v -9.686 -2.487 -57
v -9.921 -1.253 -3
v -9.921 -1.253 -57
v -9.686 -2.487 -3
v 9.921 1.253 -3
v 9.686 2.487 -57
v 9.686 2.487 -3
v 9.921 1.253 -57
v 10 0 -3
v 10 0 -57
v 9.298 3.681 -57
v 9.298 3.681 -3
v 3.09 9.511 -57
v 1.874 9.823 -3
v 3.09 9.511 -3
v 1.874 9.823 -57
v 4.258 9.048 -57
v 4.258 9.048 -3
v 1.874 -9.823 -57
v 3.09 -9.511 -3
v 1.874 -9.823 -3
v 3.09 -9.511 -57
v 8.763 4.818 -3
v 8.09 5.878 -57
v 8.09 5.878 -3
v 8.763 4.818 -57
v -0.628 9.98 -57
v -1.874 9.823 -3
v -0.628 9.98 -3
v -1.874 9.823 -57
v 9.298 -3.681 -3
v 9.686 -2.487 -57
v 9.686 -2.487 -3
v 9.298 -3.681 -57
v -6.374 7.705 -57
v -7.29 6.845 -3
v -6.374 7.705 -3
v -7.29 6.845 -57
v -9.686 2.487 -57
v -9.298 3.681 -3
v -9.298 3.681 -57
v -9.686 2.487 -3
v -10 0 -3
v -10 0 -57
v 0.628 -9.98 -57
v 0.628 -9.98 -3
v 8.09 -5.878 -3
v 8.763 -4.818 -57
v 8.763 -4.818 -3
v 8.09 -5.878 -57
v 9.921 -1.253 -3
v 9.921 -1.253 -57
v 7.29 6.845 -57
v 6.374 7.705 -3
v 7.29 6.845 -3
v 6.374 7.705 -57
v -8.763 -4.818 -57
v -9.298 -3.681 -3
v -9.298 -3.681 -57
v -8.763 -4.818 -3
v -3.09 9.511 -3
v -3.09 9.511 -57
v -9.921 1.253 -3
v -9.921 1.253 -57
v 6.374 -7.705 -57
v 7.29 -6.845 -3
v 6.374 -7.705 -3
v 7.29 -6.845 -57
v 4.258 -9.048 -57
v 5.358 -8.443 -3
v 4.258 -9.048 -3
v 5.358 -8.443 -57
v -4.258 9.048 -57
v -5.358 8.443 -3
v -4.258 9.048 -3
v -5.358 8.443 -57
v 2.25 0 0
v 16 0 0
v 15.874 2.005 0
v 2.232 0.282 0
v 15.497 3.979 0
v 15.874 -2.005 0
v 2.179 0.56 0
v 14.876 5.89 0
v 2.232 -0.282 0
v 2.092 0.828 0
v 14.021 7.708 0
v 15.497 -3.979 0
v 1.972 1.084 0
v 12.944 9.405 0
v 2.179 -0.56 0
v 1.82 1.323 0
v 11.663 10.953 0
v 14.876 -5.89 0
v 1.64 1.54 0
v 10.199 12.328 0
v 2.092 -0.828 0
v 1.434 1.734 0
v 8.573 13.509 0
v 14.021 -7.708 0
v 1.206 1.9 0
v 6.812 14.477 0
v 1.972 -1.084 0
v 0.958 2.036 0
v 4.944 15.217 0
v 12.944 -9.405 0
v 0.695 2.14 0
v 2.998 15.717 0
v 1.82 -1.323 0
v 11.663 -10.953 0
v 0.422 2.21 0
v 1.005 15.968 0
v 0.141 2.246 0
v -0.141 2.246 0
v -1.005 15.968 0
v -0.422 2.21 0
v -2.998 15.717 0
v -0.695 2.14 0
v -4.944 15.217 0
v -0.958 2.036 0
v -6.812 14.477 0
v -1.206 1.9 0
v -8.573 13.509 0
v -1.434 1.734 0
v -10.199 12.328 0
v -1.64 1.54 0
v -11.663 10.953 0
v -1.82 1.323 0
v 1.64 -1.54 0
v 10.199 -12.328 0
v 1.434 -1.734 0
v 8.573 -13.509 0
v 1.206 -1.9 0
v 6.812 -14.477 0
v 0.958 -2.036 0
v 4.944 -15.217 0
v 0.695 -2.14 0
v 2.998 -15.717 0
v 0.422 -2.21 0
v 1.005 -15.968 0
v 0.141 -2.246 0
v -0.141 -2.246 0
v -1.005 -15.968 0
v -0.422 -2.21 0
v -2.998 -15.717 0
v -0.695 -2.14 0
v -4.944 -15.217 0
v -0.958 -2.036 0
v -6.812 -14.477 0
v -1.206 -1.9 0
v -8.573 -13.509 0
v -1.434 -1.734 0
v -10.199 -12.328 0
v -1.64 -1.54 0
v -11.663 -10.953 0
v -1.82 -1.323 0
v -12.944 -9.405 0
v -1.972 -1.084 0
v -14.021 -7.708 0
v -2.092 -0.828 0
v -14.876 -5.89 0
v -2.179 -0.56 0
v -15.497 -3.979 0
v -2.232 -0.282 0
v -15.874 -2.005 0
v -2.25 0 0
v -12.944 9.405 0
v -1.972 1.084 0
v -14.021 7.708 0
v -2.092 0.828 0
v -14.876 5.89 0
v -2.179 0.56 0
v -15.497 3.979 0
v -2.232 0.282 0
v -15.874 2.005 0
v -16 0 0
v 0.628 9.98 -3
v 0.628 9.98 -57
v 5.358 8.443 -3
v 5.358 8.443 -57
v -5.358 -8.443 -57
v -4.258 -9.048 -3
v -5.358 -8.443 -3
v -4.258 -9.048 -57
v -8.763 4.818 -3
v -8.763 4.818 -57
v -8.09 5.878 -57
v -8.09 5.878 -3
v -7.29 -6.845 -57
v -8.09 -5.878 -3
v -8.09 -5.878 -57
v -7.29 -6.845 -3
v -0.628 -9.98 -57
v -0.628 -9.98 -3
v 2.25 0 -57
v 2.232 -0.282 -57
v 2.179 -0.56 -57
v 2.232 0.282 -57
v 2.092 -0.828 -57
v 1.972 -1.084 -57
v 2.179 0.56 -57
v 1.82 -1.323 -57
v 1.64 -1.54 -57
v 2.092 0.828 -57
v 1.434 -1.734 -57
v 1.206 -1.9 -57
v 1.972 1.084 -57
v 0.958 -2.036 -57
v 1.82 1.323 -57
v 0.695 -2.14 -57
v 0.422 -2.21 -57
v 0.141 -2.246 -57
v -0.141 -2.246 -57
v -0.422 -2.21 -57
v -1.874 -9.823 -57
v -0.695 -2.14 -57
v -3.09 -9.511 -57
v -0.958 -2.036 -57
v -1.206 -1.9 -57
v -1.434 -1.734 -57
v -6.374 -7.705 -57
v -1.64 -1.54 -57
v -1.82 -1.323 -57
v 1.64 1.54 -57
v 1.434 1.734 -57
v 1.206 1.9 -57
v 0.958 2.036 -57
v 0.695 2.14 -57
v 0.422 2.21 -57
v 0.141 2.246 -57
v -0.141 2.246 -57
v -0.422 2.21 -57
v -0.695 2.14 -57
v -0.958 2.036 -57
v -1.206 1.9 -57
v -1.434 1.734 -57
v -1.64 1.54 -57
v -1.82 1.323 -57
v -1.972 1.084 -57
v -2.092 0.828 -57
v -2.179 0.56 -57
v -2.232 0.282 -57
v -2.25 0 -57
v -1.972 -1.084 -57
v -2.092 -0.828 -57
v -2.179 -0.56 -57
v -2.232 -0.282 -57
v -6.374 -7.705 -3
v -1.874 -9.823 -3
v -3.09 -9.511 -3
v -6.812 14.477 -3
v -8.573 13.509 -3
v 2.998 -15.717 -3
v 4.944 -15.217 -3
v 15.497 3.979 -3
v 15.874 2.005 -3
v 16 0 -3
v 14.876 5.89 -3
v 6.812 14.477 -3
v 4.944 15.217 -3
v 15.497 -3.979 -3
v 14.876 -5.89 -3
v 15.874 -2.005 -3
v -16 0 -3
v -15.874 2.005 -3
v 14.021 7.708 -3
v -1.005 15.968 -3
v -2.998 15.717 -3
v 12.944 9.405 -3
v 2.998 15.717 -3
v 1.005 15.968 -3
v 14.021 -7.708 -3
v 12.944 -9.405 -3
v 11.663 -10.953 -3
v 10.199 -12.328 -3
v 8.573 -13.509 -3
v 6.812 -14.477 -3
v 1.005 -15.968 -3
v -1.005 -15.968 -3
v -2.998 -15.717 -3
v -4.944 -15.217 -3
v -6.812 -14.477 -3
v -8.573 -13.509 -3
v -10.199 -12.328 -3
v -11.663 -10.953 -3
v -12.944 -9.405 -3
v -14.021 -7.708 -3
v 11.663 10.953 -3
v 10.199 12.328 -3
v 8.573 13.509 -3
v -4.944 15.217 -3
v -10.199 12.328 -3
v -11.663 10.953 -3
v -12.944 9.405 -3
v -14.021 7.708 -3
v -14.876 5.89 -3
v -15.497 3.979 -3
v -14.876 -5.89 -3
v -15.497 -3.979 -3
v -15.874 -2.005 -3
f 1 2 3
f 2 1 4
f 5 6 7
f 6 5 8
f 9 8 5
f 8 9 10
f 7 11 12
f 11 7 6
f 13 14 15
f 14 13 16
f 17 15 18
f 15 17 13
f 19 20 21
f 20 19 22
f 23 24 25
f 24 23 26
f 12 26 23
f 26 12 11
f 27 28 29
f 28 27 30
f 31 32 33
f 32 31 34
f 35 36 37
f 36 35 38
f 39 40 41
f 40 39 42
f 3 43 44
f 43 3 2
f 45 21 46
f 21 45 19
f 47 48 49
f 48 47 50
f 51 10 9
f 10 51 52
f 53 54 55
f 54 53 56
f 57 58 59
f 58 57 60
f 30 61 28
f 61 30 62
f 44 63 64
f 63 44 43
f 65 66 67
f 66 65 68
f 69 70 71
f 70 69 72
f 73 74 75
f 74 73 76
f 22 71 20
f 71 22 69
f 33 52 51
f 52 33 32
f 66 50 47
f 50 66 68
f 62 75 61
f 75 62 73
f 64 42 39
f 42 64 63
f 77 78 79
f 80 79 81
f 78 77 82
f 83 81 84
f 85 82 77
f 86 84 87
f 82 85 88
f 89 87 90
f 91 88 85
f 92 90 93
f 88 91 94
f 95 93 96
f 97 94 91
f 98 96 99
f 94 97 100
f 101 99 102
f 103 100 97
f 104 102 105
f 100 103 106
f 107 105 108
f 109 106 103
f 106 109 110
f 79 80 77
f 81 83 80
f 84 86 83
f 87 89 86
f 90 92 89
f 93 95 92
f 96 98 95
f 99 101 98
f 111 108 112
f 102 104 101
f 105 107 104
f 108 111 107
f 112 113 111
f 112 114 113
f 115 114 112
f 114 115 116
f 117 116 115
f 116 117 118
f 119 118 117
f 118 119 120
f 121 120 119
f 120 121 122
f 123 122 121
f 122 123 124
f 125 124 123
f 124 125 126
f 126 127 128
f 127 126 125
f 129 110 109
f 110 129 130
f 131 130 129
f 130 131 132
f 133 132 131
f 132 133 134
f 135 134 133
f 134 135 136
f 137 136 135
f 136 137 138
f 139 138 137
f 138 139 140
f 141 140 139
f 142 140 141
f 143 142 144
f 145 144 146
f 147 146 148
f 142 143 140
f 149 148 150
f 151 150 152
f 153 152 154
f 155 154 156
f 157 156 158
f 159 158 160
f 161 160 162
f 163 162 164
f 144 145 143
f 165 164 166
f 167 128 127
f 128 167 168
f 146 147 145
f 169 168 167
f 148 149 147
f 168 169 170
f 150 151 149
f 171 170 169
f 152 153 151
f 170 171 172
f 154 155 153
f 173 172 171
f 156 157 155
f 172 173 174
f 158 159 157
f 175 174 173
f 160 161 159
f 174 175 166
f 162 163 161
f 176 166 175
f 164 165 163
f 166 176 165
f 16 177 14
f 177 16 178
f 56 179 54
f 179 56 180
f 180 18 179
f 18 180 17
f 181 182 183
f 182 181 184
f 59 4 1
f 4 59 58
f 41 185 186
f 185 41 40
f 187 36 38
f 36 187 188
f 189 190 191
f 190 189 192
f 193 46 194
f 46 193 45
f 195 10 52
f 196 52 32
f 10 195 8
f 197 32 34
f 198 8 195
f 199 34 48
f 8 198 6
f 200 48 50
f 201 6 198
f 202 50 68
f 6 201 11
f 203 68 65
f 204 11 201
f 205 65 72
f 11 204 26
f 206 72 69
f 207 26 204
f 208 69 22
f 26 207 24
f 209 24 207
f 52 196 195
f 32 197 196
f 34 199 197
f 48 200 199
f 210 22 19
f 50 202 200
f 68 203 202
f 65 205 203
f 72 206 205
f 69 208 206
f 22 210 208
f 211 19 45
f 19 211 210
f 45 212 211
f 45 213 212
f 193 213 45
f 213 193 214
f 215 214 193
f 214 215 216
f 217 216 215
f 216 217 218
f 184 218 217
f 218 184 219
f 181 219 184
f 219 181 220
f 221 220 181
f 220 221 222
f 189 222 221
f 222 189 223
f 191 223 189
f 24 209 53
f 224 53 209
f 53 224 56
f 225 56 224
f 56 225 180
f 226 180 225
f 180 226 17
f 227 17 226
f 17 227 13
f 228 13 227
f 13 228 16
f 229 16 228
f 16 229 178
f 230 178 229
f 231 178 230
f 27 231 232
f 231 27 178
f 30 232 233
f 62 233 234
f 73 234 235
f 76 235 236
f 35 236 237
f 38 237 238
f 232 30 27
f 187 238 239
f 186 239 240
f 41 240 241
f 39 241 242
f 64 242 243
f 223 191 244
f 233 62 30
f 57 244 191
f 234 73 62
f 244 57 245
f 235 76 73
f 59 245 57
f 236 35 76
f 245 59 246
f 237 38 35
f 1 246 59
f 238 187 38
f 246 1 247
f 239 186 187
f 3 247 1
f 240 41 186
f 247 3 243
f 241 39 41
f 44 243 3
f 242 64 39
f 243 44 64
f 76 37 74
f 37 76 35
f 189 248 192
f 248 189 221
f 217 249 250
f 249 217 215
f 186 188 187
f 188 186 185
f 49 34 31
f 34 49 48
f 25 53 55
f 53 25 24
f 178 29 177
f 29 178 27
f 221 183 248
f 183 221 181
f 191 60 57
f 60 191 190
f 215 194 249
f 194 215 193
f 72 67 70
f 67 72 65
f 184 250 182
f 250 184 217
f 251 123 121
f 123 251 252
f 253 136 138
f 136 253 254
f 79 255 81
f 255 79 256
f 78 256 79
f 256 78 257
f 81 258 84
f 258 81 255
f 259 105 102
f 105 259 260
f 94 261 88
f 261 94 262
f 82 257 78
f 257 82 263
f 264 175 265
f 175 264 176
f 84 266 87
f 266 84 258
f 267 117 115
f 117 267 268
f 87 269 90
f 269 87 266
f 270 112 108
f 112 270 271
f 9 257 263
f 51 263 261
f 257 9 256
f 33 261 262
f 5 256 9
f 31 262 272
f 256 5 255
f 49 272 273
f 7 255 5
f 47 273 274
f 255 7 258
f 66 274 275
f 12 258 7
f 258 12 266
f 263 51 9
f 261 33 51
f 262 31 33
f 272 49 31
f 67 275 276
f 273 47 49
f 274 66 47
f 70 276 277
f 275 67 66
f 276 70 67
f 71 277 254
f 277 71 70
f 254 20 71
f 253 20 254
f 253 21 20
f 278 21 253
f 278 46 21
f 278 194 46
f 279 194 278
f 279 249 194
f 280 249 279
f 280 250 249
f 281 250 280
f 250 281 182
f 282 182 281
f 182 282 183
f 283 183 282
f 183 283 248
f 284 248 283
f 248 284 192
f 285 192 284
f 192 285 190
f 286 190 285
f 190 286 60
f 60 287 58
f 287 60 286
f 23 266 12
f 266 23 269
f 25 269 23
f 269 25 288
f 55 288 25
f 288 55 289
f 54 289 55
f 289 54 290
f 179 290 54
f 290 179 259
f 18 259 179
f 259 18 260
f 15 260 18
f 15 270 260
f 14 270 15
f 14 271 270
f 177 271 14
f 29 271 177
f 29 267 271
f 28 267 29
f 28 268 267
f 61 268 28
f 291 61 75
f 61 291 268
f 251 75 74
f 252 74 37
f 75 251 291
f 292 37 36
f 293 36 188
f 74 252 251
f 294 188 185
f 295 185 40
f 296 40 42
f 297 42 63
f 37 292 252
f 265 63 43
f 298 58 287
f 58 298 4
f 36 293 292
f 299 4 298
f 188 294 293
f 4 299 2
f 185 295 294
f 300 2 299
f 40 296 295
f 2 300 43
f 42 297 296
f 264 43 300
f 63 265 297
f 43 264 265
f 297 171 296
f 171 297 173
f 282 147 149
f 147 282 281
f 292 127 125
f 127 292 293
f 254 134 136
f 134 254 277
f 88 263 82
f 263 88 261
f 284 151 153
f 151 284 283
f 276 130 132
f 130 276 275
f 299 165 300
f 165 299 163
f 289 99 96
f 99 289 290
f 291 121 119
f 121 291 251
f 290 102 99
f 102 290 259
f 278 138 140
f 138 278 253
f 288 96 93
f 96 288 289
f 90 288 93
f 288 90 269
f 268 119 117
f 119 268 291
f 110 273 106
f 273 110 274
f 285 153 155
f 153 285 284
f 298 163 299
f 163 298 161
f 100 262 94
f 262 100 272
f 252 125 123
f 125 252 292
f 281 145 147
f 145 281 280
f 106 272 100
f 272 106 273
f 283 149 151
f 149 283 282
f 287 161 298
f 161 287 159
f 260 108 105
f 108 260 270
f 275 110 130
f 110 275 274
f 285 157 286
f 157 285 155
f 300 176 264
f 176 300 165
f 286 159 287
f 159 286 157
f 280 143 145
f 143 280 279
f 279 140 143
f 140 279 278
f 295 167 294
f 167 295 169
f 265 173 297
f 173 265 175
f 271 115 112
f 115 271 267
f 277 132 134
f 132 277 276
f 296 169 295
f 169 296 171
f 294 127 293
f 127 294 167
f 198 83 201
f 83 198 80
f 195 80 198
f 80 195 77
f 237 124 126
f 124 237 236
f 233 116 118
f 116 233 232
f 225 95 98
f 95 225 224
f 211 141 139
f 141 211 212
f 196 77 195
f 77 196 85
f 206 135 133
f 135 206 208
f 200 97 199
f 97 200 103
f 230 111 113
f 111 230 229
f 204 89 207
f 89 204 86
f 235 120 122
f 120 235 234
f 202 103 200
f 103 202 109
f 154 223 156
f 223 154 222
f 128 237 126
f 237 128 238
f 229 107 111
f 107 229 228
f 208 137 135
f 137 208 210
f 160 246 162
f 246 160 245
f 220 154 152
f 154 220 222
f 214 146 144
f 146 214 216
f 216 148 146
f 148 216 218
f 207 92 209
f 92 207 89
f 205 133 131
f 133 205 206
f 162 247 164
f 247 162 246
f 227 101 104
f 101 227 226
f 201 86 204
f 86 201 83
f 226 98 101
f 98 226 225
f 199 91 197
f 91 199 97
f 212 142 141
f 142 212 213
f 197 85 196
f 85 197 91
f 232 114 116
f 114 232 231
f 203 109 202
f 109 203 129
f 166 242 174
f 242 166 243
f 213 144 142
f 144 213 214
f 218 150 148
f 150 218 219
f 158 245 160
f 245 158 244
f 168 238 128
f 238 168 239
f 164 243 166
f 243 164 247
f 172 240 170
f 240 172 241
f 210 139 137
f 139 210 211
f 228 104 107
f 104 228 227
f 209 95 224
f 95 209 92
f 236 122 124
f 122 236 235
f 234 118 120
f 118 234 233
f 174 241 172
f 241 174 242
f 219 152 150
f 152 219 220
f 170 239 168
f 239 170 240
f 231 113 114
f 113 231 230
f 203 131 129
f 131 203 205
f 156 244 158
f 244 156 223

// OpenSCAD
$fn = 50;


difference() {
	union() {
		translate(v = [0, 0, -57.0000000000]) {
			cylinder(h = 57, r = 10.0000000000);
		}
		translate(v = [0, 0, -3.0000000000]) {
			cylinder(h = 3, r = 16.0000000000);
		}
	}
	union() {
		#translate(v = [0, 0, -57]) {
			cylinder(h = 57, r = 2.2500000000);
		}
	}
}
